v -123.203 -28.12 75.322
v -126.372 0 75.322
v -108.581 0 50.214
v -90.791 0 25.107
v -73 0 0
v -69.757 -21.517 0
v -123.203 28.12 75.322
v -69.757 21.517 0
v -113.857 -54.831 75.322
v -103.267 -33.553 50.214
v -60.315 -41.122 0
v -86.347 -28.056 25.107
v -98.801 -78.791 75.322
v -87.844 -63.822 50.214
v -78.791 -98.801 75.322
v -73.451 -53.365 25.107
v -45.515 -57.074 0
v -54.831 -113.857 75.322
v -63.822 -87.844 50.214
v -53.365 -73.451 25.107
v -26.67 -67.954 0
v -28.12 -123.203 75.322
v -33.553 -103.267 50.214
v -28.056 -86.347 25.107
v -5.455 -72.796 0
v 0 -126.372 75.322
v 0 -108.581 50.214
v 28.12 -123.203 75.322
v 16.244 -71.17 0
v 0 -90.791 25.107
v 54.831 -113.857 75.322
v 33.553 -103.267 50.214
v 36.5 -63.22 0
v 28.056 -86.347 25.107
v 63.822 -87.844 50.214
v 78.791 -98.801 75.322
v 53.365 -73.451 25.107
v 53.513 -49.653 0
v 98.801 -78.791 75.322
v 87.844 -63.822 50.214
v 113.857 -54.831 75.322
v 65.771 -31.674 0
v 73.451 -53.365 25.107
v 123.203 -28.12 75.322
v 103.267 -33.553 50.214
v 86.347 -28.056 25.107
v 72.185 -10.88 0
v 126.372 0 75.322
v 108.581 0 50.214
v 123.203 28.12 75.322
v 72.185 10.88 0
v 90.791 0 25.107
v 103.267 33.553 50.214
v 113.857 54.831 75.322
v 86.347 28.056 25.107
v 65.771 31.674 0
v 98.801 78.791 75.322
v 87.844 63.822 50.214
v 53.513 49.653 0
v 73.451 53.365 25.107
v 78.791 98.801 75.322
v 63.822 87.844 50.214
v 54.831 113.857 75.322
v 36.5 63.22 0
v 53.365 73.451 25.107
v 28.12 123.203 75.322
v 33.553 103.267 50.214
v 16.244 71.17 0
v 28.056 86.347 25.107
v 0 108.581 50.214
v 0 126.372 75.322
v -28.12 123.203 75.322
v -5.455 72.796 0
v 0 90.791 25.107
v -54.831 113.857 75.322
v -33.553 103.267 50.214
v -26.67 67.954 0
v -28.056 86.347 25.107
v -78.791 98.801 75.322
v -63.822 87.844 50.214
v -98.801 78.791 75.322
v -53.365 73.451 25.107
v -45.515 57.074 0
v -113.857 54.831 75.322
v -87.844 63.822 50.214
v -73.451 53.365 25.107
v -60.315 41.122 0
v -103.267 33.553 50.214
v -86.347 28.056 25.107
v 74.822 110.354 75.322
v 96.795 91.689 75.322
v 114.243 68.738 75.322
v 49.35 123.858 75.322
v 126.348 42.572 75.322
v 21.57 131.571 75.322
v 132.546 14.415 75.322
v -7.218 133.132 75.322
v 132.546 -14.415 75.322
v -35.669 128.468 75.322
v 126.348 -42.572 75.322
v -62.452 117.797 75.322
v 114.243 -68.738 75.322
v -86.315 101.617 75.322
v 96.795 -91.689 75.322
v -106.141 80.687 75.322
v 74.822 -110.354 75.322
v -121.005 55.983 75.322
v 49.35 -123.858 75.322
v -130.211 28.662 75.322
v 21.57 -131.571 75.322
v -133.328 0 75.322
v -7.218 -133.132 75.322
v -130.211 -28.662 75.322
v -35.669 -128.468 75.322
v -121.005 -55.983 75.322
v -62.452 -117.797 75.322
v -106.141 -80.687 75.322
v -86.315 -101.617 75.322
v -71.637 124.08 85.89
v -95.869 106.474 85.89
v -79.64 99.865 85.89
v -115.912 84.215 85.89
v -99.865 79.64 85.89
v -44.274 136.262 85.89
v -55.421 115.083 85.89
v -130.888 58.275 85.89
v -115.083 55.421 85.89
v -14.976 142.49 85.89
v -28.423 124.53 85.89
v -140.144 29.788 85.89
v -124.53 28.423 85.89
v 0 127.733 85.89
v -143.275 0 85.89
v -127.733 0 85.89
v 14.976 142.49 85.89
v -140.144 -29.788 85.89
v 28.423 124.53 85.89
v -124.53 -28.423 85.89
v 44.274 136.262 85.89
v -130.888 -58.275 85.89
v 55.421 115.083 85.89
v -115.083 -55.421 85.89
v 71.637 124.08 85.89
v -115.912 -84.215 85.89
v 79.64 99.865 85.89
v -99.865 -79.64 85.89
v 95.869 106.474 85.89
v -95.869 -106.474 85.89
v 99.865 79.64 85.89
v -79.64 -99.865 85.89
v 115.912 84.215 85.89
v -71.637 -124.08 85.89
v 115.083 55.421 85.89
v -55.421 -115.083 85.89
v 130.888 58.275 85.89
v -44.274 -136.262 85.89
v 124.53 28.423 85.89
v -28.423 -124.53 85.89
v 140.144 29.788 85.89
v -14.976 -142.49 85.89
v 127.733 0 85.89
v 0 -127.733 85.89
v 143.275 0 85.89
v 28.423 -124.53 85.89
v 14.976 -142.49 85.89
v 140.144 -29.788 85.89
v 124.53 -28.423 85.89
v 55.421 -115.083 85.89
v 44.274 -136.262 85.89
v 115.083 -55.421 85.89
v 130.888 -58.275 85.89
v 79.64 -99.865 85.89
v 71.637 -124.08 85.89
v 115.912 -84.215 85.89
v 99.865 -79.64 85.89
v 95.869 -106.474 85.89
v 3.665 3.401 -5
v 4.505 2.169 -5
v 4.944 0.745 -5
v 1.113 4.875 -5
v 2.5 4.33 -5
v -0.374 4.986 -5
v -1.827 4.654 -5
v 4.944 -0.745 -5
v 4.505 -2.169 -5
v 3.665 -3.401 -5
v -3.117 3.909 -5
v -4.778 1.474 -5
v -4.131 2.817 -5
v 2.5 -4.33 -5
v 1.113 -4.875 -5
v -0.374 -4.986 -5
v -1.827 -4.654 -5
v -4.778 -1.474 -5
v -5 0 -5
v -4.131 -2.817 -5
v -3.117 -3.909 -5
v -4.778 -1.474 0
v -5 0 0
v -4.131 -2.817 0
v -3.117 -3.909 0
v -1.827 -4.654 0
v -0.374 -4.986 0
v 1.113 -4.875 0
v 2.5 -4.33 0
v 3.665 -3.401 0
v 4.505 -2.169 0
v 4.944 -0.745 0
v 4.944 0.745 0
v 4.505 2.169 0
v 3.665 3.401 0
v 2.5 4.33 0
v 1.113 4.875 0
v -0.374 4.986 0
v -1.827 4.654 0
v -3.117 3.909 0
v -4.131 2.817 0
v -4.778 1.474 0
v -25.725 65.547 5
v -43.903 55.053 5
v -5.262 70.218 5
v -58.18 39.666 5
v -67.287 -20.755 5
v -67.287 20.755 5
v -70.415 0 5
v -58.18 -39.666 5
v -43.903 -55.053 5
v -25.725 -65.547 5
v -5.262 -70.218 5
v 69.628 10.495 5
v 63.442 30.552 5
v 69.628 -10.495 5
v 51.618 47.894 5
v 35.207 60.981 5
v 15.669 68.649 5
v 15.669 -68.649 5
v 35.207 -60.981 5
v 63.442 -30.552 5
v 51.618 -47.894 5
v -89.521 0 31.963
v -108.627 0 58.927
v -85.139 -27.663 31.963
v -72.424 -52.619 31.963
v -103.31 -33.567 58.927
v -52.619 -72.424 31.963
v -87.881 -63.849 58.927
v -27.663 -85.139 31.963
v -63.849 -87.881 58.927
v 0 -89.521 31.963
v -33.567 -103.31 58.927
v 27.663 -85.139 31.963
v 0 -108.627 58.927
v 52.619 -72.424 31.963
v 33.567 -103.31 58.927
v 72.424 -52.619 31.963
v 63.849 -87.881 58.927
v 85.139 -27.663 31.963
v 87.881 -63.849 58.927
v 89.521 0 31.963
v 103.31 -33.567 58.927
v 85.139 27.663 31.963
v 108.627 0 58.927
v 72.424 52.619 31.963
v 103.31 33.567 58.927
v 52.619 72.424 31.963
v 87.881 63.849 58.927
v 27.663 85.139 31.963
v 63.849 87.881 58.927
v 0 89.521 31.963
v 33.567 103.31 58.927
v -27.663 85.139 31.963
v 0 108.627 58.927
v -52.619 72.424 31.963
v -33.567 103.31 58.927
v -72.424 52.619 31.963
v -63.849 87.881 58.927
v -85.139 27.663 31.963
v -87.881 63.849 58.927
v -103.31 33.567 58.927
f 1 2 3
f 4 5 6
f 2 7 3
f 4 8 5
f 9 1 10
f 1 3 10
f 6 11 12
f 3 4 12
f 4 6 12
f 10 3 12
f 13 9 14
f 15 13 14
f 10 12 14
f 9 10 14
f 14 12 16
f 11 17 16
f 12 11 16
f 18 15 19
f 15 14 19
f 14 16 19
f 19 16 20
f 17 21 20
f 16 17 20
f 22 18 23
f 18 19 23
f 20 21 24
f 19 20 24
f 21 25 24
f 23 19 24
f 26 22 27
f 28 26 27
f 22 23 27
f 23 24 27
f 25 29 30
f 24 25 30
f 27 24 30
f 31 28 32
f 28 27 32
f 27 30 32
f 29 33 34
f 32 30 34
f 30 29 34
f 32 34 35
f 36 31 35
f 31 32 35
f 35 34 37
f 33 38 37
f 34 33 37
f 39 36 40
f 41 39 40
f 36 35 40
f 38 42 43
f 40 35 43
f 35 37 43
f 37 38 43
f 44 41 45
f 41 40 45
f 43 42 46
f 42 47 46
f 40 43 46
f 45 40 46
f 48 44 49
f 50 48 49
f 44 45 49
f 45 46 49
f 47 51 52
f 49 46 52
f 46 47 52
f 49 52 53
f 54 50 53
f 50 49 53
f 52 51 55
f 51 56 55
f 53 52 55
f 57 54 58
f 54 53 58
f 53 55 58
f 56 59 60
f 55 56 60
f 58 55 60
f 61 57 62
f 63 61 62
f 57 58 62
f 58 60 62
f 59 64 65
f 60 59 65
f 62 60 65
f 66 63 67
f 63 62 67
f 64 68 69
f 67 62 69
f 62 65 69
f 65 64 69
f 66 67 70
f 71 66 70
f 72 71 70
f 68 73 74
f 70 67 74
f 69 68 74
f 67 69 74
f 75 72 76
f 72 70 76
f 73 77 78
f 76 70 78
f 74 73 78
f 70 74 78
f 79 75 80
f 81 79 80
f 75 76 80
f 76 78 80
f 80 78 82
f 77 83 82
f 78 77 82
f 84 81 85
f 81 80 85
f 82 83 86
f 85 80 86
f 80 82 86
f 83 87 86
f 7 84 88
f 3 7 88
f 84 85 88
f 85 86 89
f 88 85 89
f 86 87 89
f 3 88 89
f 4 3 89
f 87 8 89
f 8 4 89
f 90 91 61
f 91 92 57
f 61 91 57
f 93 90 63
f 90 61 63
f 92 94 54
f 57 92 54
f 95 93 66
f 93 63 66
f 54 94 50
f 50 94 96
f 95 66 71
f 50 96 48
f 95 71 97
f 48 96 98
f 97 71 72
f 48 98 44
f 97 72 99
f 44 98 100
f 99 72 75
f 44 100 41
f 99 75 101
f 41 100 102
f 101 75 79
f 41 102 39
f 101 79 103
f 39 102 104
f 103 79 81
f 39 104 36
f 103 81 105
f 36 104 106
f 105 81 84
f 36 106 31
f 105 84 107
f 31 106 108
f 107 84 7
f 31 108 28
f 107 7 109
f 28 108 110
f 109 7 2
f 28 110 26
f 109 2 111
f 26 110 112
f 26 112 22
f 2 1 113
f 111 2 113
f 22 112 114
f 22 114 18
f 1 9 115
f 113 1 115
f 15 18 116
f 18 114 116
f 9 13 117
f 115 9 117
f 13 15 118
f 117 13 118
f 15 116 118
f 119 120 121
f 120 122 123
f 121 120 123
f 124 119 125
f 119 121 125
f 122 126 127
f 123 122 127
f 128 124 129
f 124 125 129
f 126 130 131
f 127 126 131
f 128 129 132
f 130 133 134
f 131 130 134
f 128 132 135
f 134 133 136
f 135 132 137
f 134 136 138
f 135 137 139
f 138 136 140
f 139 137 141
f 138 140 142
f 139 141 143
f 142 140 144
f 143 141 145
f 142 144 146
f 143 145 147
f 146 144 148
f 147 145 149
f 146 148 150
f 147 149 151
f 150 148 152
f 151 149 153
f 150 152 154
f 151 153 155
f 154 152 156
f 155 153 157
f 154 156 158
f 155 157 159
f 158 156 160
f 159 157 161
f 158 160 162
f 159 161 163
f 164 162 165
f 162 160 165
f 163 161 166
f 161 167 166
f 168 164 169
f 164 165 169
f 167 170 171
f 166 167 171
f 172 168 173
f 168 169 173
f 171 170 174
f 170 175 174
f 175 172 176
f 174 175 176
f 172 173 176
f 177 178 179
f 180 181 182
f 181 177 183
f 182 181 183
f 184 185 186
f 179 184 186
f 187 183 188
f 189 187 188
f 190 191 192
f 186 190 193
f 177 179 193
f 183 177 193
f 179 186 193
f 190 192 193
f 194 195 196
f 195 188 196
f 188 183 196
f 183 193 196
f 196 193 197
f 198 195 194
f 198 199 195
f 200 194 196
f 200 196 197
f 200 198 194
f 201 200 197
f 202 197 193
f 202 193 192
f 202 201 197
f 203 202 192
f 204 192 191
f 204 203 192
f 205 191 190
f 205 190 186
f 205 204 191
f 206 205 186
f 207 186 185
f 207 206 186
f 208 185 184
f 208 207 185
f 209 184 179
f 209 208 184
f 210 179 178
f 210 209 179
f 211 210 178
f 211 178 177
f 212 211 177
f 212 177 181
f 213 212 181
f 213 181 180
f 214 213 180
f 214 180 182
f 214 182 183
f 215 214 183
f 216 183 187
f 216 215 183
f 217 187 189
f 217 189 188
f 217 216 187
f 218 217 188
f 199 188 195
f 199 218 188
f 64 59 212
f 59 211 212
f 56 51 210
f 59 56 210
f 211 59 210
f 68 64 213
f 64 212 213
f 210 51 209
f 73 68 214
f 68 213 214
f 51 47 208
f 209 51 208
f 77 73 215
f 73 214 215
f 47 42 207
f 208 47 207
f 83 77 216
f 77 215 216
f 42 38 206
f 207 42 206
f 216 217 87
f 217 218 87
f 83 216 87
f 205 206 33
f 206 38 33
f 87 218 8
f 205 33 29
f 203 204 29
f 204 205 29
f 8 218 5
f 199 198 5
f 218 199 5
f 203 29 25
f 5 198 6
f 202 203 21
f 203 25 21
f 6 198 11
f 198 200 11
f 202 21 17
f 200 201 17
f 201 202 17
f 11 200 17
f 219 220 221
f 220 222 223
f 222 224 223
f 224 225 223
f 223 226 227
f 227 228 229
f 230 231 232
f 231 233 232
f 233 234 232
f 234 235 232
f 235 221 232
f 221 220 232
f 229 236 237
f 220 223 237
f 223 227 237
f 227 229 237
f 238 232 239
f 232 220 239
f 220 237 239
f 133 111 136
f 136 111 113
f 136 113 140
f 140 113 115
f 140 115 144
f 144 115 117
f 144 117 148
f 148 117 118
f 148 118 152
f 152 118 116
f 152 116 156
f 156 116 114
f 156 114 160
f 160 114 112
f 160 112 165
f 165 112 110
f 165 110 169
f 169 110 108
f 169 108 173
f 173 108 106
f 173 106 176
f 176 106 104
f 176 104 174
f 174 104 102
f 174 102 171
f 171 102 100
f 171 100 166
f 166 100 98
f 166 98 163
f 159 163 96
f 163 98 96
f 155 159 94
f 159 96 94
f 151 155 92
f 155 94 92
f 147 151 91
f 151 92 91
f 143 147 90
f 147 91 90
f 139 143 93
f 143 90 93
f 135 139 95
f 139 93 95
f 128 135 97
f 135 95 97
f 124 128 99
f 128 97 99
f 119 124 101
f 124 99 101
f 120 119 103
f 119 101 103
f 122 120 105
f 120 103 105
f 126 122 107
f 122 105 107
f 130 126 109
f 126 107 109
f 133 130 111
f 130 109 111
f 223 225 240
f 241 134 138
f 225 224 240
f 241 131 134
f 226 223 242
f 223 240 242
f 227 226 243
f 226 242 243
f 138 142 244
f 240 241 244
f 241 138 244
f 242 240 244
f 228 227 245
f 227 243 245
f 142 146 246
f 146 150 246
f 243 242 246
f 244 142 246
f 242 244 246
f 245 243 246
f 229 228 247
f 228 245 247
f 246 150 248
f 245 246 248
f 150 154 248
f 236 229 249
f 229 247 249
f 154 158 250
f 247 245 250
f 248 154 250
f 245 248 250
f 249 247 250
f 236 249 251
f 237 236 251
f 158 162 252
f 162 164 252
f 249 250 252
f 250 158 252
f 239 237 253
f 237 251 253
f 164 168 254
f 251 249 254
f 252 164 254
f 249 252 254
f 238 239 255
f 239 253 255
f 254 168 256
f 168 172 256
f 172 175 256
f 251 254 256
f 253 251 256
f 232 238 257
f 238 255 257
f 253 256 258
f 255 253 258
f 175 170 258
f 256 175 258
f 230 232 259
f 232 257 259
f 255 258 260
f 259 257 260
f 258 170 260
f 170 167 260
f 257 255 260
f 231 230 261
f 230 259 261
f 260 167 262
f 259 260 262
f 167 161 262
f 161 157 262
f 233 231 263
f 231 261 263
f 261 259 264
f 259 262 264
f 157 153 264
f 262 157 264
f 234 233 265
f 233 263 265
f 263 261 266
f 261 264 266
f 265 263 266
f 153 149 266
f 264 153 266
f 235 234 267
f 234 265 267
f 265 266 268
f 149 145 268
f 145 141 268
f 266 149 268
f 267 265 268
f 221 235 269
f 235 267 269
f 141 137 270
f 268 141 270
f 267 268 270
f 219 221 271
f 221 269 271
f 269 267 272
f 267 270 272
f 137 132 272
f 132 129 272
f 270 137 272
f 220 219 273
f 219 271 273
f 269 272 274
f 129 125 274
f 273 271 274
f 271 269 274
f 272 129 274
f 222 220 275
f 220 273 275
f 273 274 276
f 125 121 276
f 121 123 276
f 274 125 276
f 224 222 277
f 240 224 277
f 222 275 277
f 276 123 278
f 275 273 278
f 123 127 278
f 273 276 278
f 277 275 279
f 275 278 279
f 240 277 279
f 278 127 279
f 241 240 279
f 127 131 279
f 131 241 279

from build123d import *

# Parameters (mm, degrees)
F0_W = 5
F0_H = 5


with BuildPart() as f1:
    # F0 (on Front) → F1 (revolve)
    with BuildSketch(Plane.XZ):
        Polygon((-5, 0), (0, 0), (0, 5), (-70.414929, 5), (-127.732546, 85.890315), (-143.274711, 85.890315), (-133.327724, 75.321652), (-126.371749, 75.321652), (-73, 0), align=None)
        with Locations((-2.5, -2.5)):
            Rectangle(F0_W, F0_H)
    revolve(axis=Axis((0, 0, 191.825941), (0, 0, 1)))


solid = f1.part
